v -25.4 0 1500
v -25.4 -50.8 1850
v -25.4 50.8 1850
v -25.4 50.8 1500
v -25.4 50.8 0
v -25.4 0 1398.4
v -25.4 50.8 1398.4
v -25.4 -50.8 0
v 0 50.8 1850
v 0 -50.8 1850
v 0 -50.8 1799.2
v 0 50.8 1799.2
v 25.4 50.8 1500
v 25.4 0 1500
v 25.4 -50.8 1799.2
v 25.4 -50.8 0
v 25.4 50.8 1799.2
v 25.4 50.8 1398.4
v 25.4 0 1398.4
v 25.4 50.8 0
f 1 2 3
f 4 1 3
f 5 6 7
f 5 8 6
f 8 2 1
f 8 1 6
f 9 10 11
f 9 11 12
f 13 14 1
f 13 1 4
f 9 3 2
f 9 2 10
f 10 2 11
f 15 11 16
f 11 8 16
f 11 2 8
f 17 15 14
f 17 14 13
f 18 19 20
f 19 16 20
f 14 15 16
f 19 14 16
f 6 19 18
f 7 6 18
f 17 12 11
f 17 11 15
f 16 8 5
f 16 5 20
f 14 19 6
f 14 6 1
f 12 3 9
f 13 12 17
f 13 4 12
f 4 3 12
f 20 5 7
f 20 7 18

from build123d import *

# Parameters (mm, degrees)
F0_W     = 50.8
F0_H     = 101.6
F1_DEPTH = 1850
F2_W     = 50.8
F2_H     = 101.6
F3_DEPTH = 50
F4_W     = 25.4
F4_H     = 101.6
F5_DEPTH = 50.8


with BuildPart() as f1:
    # F0 (on Top) → F1 (new body)
    with BuildSketch(Plane.XY):
        Rectangle(F0_W, F0_H)
    extrude(amount=F1_DEPTH)

    # F2 (on Right) → F3 (cut, symmetric)
    with BuildSketch(Plane.YZ):
        with Locations((25.4, 1449.2)):
            Rectangle(F2_W, F2_H)
    extrude(amount=F3_DEPTH, both=True, mode=Mode.SUBTRACT)

    # F4 (on face) → F5 (cut)
    with BuildSketch(Plane.XY.offset(1850)):
        with Locations((12.7, 0)):
            Rectangle(F4_W, F4_H)
    extrude(amount=-F5_DEPTH, mode=Mode.SUBTRACT)


solid = f1.part
